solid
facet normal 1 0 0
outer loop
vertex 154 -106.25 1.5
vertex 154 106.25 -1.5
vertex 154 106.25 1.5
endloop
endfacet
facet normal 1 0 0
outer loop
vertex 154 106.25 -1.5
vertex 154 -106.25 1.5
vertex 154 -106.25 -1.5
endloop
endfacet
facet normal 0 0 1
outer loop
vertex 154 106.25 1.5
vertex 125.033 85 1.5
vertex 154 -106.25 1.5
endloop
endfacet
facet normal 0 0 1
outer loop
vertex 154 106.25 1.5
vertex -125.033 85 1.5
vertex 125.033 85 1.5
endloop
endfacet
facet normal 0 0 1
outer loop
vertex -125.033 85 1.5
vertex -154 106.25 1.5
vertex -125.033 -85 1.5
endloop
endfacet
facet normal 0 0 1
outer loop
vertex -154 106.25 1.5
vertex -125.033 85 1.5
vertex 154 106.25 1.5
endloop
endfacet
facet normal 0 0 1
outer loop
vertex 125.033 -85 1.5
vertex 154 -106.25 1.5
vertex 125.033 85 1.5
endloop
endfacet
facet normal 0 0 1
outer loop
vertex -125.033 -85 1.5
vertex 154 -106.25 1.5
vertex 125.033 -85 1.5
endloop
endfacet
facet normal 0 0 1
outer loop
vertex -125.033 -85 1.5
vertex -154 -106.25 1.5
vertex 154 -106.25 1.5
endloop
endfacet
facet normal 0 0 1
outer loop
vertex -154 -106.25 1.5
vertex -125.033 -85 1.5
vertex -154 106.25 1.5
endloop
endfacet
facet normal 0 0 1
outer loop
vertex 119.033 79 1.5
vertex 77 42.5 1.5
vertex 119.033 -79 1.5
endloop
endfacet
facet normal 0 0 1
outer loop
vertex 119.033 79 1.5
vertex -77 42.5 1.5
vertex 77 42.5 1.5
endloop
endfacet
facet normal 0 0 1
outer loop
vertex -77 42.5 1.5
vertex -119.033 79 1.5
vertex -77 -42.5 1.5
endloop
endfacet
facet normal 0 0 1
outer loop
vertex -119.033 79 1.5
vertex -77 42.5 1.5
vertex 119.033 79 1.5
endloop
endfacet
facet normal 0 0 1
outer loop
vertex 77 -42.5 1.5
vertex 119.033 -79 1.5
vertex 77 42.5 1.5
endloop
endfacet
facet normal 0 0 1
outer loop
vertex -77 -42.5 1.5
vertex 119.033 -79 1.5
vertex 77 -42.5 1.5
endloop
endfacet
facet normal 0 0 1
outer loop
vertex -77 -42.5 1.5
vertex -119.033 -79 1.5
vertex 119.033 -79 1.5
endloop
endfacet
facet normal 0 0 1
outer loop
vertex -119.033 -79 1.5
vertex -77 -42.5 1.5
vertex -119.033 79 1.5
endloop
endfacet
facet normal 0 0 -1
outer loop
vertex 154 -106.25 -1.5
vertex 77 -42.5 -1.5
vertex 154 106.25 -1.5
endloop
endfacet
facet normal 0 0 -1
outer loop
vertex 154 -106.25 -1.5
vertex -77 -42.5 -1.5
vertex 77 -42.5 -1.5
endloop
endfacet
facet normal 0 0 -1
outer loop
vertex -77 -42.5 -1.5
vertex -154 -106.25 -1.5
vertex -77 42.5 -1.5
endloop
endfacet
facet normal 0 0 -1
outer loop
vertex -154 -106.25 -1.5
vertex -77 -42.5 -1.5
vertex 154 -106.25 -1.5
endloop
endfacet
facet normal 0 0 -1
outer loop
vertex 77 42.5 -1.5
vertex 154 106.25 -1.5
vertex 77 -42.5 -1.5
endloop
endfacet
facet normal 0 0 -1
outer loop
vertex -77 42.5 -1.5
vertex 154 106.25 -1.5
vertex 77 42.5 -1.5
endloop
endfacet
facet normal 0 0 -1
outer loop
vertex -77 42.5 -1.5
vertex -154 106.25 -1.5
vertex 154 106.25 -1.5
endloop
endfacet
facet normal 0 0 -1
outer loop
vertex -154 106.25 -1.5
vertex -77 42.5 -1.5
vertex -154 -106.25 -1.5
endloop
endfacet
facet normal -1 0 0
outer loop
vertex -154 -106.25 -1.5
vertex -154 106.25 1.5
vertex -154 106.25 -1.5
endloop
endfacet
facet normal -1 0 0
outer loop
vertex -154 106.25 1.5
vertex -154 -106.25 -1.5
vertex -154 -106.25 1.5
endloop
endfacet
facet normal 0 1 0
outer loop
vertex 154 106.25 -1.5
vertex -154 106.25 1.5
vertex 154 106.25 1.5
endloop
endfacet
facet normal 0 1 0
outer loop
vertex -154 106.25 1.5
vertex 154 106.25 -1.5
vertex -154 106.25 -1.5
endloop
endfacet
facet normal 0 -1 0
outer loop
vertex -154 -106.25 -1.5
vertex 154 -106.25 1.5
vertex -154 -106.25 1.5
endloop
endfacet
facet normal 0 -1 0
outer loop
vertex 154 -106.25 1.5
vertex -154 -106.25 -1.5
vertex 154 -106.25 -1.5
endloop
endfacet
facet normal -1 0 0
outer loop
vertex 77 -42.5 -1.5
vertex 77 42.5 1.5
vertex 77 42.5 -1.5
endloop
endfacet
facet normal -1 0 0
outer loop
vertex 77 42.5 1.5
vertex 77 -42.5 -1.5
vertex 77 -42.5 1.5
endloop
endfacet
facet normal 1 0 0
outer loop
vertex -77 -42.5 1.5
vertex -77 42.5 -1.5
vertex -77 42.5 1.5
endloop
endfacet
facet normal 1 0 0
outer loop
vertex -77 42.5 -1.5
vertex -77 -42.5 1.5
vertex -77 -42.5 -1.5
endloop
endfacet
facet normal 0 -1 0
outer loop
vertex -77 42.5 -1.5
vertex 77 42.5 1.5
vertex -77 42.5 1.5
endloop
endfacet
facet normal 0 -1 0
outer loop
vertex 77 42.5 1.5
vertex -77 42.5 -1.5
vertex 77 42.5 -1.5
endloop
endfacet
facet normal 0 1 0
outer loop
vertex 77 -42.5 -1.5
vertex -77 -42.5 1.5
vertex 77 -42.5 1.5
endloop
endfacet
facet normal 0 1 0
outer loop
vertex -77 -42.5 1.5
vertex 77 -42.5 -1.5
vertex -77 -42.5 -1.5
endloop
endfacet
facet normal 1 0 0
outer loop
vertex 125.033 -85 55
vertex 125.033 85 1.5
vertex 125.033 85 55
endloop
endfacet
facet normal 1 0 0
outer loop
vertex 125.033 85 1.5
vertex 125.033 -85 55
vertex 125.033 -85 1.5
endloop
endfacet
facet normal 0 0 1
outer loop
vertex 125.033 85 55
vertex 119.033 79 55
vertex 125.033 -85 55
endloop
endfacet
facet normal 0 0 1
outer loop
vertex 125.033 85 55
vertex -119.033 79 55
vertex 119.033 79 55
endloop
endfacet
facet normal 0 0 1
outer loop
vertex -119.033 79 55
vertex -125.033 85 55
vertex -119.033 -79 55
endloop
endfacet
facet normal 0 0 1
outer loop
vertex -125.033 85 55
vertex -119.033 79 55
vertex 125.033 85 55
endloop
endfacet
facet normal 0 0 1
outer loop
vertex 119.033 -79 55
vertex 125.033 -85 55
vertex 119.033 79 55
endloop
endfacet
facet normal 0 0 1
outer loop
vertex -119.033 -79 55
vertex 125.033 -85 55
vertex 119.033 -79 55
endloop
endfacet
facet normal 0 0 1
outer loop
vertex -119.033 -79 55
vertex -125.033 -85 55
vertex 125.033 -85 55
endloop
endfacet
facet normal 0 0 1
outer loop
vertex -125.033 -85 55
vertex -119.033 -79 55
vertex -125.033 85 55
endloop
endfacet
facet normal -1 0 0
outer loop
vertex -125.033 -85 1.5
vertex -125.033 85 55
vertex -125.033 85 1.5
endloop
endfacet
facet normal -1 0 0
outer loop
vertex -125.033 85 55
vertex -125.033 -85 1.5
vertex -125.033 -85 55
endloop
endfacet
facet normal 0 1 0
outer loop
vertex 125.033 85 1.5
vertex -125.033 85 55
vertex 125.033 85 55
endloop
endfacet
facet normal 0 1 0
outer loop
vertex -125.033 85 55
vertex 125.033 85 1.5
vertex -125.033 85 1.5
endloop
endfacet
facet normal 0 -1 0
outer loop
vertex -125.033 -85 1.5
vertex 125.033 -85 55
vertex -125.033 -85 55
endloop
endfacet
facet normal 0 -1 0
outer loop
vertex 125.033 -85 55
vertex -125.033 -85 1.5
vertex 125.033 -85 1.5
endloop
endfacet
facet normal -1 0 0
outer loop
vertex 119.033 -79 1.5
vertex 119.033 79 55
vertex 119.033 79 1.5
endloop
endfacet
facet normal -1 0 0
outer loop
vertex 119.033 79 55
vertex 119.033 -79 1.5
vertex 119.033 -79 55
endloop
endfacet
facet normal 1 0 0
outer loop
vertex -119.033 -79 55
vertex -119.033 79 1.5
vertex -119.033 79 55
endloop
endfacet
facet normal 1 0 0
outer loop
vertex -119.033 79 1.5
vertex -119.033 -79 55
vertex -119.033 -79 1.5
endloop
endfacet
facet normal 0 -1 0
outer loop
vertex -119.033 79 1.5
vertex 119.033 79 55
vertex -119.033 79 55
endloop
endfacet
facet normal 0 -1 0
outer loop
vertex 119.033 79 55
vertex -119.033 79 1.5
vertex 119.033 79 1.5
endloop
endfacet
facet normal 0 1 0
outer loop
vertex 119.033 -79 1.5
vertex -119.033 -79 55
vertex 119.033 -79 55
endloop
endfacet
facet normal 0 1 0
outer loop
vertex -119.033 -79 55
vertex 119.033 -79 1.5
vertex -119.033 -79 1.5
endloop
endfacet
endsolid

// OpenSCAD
// Obscur materializado
// Caja de madera
// 2022

ancho = 3;
anchoPantalla = 154;
altoPantalla = 85;
anchoPpt = anchoPantalla * 2;
altoPpt = altoPantalla * 2.5;

anchoCaja =   anchoPpt * .8119;
altoCaja = altoPpt * .8; ;
profundoCaja = 55;

gris = 155 / 255;

// Paspartu
color([gris, gris, gris], 1) {
difference() {
    cube ([anchoPpt, altoPpt, ancho], true);
    cube ([anchoPantalla, altoPantalla, ancho + 1], true);
}
}
// Caja
color ("Orange", 1) {
    translate([0, 0, profundoCaja / 2])
difference() {
    cube ([anchoCaja, altoCaja, profundoCaja] , true);
    cube ([anchoCaja - 12, altoCaja - 12, profundoCaja + 1] , true);
}
}

/*
gris2 = 50 / 255;
// Marco
color ([gris2, gris2, gris2], 1) {
    translate([0, 0, -1])
difference() {
    cube ([anchoPpt + 50, altoPpt + 50, ancho] , true);
    cube ([anchoPpt, altoPpt, ancho +1 ] , true);
}
}
*/
echo ("ancho = ");
echo (anchoPpt);

echo ("alto = ");
echo (altoPpt);

echo ("Caja ancho= ");
echo (anchoCaja);

echo ("Caja alto = ");
echo (altoCaja);

echo(((altoPpt * anchoPpt) / (anchoPantalla * altoPantalla) )/ 1.64);
